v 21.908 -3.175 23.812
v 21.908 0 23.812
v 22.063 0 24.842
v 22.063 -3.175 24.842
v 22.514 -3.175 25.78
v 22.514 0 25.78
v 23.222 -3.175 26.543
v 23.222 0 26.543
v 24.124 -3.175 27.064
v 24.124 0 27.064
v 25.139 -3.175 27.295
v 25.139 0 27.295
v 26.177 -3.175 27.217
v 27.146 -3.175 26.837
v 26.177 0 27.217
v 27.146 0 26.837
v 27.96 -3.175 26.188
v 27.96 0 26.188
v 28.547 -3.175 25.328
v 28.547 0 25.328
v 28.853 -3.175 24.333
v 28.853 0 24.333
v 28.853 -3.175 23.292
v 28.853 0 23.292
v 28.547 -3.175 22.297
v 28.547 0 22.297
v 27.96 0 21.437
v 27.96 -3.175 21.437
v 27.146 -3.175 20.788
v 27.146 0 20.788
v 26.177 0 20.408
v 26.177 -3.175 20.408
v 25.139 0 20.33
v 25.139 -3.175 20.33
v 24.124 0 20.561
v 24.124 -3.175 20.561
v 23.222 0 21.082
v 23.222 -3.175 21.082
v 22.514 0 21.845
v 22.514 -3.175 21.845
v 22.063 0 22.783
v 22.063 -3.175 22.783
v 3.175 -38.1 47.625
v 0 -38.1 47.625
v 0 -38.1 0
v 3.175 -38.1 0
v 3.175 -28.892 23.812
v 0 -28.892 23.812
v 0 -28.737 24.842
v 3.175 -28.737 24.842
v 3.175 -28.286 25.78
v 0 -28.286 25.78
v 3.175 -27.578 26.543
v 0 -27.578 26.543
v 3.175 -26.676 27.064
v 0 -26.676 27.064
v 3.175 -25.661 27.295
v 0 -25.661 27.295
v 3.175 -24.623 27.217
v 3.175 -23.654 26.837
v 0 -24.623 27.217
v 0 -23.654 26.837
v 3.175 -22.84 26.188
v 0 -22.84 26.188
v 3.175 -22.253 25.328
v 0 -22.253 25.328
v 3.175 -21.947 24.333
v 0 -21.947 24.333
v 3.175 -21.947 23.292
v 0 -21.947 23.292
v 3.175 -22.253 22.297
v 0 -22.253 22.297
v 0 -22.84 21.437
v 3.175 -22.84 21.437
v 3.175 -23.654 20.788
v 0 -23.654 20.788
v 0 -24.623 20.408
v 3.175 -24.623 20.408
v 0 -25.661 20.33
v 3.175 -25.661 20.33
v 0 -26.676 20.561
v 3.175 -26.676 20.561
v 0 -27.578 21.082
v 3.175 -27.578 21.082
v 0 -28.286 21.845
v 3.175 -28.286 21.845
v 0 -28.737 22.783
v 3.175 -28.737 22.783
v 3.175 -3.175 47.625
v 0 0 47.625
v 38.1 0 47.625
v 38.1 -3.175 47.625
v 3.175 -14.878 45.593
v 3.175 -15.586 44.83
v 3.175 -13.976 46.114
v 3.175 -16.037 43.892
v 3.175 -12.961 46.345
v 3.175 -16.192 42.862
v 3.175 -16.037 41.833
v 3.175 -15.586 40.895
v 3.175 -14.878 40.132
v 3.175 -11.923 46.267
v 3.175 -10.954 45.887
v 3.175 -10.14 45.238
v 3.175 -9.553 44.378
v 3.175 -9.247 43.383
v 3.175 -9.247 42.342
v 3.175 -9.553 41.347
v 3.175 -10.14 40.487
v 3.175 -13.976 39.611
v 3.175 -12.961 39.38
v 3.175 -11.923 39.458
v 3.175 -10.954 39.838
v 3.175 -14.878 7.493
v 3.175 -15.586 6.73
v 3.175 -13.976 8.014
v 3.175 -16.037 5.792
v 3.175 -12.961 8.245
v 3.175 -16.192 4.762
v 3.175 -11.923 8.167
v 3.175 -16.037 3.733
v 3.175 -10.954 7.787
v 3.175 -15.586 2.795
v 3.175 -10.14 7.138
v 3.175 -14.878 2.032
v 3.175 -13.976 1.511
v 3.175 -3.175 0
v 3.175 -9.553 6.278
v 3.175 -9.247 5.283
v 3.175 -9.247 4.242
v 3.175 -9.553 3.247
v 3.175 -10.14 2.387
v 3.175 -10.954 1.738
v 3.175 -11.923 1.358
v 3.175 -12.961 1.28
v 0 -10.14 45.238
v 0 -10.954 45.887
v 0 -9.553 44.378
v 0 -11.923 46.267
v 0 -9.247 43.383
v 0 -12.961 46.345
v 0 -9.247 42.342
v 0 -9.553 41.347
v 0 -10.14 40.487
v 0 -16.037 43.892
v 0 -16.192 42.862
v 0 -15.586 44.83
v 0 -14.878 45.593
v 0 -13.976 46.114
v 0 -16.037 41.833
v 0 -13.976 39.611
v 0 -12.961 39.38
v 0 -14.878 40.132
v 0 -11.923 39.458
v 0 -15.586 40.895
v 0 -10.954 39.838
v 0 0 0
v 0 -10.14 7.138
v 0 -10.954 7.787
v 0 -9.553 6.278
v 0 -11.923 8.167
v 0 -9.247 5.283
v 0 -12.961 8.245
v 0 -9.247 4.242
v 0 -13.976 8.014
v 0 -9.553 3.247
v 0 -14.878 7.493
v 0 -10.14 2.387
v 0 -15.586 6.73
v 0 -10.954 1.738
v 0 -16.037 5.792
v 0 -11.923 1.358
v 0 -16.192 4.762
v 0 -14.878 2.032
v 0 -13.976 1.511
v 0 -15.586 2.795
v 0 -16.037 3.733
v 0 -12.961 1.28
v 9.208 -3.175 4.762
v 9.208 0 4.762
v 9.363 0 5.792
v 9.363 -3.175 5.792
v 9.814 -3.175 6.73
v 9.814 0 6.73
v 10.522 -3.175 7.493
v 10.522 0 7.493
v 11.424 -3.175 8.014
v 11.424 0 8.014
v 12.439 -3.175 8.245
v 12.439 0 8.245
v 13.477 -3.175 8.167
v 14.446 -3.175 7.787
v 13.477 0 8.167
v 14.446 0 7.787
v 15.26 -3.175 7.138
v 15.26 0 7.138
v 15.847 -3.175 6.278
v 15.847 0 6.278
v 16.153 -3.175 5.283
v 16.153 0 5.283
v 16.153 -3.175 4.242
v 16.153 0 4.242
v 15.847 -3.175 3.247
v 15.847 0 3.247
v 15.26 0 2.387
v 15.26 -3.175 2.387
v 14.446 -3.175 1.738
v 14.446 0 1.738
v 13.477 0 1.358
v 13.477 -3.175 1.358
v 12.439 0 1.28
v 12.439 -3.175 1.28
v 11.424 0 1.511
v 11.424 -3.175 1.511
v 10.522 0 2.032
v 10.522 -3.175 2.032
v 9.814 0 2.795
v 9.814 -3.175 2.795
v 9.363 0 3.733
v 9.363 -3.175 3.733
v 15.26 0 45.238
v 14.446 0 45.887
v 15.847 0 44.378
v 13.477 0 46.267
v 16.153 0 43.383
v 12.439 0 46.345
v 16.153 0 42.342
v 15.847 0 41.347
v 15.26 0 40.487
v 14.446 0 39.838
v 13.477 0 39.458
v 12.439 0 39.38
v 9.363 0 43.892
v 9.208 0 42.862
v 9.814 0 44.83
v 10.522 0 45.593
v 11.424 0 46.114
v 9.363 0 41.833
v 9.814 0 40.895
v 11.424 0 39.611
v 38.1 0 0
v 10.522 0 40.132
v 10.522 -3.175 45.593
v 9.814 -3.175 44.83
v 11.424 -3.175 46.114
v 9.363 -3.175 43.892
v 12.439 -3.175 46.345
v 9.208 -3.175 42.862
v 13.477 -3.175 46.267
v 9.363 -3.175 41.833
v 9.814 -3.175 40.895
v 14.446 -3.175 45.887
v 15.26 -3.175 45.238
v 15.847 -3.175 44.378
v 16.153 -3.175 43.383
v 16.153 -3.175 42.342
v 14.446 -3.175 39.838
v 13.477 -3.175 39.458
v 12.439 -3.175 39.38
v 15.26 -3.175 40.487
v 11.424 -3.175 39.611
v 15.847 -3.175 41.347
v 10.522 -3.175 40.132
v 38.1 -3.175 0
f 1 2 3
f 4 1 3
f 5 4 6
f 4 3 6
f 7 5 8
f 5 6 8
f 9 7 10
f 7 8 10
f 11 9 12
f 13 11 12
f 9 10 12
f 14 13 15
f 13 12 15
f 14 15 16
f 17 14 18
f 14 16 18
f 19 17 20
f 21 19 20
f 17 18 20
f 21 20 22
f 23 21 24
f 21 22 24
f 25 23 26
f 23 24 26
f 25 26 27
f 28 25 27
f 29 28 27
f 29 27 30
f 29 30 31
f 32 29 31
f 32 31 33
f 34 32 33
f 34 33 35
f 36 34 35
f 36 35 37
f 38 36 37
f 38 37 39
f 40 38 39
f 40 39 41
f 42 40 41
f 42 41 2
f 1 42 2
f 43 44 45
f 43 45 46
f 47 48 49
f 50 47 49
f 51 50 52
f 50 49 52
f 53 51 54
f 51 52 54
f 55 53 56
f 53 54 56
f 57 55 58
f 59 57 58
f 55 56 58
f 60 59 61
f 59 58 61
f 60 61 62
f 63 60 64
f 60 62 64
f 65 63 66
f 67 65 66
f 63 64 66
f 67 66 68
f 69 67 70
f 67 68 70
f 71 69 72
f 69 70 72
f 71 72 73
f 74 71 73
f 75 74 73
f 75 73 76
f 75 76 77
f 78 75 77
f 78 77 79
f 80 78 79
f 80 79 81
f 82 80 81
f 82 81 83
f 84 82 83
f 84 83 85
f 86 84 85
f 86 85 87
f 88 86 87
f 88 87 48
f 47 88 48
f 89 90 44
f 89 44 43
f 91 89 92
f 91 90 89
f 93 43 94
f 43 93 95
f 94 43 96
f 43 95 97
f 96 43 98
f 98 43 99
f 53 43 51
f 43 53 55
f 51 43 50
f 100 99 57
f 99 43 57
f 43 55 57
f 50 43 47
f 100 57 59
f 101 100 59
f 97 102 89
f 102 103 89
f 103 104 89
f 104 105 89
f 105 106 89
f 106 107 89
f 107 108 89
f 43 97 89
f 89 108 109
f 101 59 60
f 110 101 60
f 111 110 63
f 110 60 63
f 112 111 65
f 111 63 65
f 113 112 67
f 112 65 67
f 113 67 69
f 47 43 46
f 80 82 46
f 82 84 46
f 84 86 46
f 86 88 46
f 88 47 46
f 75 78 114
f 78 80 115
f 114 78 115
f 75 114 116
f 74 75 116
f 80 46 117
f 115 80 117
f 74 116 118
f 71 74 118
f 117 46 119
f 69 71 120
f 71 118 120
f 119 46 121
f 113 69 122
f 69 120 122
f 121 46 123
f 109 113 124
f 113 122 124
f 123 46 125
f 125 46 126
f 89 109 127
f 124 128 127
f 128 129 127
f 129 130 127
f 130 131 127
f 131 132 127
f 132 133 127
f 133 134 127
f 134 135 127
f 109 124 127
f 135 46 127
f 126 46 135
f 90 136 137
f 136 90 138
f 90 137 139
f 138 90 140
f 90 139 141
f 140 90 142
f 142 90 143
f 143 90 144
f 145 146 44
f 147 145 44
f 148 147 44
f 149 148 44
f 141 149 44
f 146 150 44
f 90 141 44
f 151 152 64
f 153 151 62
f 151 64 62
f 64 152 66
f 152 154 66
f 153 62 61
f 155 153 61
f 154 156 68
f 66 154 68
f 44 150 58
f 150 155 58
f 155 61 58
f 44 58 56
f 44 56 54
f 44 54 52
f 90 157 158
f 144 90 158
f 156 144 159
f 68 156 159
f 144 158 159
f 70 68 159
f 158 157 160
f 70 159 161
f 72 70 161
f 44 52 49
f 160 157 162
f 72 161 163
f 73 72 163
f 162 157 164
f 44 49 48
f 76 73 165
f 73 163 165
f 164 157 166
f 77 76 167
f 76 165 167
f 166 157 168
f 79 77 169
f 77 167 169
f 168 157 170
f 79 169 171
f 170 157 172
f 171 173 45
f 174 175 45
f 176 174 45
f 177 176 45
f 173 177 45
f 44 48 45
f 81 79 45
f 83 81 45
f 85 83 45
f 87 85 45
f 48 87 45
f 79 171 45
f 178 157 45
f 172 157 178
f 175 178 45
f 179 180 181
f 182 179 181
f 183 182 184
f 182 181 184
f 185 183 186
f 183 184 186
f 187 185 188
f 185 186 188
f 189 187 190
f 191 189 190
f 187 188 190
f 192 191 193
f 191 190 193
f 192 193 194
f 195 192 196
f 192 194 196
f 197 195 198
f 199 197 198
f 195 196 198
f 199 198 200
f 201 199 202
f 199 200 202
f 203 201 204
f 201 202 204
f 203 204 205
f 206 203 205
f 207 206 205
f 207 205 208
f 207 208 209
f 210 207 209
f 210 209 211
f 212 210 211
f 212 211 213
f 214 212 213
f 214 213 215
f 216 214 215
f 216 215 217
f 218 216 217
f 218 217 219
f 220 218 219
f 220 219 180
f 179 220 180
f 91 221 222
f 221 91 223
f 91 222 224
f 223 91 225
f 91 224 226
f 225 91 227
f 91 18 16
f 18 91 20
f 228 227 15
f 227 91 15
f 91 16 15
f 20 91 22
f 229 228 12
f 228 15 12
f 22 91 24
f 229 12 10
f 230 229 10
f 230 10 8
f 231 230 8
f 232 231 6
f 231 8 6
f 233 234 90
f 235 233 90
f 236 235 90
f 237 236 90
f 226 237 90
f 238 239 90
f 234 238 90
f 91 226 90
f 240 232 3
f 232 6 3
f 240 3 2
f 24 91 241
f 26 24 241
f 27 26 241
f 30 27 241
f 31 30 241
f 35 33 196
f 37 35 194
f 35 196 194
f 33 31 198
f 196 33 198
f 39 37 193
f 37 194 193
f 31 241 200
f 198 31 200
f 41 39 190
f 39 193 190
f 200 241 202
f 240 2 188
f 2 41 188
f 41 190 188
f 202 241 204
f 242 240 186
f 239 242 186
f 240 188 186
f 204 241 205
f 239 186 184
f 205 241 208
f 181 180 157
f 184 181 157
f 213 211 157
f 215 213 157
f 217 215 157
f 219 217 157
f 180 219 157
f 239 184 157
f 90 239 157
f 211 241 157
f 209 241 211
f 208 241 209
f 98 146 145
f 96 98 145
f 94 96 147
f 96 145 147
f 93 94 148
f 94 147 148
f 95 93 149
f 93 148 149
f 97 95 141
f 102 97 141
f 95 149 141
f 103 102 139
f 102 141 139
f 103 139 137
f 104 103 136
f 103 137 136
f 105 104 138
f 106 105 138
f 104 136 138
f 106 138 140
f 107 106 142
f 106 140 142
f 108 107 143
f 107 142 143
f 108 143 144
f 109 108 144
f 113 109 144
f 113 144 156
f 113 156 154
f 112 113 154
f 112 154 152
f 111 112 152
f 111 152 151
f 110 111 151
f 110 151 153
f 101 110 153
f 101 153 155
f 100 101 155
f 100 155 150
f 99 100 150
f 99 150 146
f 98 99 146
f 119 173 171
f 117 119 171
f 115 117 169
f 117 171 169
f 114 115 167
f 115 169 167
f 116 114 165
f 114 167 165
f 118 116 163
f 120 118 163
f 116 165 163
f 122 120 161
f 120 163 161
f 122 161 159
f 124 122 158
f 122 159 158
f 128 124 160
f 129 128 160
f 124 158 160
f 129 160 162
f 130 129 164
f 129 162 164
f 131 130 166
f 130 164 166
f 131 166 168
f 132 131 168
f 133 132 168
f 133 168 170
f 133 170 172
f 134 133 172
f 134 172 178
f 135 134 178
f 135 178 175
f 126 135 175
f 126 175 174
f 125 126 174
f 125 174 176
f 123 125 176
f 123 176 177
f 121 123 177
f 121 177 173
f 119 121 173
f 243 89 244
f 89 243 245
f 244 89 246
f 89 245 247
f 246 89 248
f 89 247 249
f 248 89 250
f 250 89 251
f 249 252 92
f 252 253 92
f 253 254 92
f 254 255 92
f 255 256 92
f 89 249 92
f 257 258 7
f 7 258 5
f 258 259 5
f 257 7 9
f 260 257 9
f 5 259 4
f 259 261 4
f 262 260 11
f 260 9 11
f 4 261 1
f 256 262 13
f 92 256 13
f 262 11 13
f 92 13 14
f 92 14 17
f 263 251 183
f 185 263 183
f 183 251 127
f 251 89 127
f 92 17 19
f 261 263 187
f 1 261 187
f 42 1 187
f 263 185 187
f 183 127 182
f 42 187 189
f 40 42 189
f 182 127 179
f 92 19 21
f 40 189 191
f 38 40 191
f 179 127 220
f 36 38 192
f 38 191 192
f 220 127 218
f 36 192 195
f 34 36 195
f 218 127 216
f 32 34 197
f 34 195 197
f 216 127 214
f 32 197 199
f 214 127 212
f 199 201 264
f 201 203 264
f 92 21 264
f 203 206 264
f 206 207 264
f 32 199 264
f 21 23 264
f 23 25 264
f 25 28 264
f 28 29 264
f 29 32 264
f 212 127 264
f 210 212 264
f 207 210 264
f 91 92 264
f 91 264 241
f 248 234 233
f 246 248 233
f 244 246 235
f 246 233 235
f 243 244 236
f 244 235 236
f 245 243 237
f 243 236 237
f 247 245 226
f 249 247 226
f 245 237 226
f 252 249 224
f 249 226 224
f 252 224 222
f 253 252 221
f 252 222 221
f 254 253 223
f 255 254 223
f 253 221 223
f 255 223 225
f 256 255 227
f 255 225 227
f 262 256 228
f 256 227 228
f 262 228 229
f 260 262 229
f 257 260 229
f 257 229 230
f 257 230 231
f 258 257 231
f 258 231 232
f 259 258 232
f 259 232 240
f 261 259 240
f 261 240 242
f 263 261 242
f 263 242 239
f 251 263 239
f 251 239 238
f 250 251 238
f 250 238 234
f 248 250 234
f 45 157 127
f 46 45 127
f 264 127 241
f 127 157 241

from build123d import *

# Parameters (mm, degrees)
F1_DEPTH = 47.625
F2_R     = 3.4925
F3_DEPTH = 25.4
F4_R     = 3.4925
F5_DEPTH = 25.4


with BuildPart() as f1:
    # F0 (on Top) → F1 (new body)
    with BuildSketch(Plane.XY):
        Polygon((38.1, 0), (0, 0), (0, -3.175), (0, -38.1), (3.175, -38.1), (3.175, -3.175), (38.1, -3.175), align=None)
    extrude(amount=F1_DEPTH)

    # F2 (on face) → F3 (cut)
    with BuildSketch(Plane(origin=(0, 0, 0), x_dir=(-1, 0, 0), z_dir=(0, 1, 0))):
        with Locations((-12.7, 42.8625)):
            Circle(F2_R)
        with Locations((-25.4, 23.8125)):
            Circle(F2_R)
        with Locations((-12.7, 4.7625)):
            Circle(F2_R)
    extrude(amount=-F3_DEPTH, mode=Mode.SUBTRACT)

    # F4 (on face) → F5 (cut)
    with BuildSketch(Plane(origin=(0, 0, 0), x_dir=(0, -1, 0), z_dir=(-1, 0, 0))):
        with Locations((12.7, 42.8625)):
            Circle(F4_R)
        with Locations((25.4, 23.8125)):
            Circle(F4_R)
        with Locations((12.7, 4.7625)):
            Circle(F4_R)
    extrude(amount=-F5_DEPTH, mode=Mode.SUBTRACT)


solid = f1.part
